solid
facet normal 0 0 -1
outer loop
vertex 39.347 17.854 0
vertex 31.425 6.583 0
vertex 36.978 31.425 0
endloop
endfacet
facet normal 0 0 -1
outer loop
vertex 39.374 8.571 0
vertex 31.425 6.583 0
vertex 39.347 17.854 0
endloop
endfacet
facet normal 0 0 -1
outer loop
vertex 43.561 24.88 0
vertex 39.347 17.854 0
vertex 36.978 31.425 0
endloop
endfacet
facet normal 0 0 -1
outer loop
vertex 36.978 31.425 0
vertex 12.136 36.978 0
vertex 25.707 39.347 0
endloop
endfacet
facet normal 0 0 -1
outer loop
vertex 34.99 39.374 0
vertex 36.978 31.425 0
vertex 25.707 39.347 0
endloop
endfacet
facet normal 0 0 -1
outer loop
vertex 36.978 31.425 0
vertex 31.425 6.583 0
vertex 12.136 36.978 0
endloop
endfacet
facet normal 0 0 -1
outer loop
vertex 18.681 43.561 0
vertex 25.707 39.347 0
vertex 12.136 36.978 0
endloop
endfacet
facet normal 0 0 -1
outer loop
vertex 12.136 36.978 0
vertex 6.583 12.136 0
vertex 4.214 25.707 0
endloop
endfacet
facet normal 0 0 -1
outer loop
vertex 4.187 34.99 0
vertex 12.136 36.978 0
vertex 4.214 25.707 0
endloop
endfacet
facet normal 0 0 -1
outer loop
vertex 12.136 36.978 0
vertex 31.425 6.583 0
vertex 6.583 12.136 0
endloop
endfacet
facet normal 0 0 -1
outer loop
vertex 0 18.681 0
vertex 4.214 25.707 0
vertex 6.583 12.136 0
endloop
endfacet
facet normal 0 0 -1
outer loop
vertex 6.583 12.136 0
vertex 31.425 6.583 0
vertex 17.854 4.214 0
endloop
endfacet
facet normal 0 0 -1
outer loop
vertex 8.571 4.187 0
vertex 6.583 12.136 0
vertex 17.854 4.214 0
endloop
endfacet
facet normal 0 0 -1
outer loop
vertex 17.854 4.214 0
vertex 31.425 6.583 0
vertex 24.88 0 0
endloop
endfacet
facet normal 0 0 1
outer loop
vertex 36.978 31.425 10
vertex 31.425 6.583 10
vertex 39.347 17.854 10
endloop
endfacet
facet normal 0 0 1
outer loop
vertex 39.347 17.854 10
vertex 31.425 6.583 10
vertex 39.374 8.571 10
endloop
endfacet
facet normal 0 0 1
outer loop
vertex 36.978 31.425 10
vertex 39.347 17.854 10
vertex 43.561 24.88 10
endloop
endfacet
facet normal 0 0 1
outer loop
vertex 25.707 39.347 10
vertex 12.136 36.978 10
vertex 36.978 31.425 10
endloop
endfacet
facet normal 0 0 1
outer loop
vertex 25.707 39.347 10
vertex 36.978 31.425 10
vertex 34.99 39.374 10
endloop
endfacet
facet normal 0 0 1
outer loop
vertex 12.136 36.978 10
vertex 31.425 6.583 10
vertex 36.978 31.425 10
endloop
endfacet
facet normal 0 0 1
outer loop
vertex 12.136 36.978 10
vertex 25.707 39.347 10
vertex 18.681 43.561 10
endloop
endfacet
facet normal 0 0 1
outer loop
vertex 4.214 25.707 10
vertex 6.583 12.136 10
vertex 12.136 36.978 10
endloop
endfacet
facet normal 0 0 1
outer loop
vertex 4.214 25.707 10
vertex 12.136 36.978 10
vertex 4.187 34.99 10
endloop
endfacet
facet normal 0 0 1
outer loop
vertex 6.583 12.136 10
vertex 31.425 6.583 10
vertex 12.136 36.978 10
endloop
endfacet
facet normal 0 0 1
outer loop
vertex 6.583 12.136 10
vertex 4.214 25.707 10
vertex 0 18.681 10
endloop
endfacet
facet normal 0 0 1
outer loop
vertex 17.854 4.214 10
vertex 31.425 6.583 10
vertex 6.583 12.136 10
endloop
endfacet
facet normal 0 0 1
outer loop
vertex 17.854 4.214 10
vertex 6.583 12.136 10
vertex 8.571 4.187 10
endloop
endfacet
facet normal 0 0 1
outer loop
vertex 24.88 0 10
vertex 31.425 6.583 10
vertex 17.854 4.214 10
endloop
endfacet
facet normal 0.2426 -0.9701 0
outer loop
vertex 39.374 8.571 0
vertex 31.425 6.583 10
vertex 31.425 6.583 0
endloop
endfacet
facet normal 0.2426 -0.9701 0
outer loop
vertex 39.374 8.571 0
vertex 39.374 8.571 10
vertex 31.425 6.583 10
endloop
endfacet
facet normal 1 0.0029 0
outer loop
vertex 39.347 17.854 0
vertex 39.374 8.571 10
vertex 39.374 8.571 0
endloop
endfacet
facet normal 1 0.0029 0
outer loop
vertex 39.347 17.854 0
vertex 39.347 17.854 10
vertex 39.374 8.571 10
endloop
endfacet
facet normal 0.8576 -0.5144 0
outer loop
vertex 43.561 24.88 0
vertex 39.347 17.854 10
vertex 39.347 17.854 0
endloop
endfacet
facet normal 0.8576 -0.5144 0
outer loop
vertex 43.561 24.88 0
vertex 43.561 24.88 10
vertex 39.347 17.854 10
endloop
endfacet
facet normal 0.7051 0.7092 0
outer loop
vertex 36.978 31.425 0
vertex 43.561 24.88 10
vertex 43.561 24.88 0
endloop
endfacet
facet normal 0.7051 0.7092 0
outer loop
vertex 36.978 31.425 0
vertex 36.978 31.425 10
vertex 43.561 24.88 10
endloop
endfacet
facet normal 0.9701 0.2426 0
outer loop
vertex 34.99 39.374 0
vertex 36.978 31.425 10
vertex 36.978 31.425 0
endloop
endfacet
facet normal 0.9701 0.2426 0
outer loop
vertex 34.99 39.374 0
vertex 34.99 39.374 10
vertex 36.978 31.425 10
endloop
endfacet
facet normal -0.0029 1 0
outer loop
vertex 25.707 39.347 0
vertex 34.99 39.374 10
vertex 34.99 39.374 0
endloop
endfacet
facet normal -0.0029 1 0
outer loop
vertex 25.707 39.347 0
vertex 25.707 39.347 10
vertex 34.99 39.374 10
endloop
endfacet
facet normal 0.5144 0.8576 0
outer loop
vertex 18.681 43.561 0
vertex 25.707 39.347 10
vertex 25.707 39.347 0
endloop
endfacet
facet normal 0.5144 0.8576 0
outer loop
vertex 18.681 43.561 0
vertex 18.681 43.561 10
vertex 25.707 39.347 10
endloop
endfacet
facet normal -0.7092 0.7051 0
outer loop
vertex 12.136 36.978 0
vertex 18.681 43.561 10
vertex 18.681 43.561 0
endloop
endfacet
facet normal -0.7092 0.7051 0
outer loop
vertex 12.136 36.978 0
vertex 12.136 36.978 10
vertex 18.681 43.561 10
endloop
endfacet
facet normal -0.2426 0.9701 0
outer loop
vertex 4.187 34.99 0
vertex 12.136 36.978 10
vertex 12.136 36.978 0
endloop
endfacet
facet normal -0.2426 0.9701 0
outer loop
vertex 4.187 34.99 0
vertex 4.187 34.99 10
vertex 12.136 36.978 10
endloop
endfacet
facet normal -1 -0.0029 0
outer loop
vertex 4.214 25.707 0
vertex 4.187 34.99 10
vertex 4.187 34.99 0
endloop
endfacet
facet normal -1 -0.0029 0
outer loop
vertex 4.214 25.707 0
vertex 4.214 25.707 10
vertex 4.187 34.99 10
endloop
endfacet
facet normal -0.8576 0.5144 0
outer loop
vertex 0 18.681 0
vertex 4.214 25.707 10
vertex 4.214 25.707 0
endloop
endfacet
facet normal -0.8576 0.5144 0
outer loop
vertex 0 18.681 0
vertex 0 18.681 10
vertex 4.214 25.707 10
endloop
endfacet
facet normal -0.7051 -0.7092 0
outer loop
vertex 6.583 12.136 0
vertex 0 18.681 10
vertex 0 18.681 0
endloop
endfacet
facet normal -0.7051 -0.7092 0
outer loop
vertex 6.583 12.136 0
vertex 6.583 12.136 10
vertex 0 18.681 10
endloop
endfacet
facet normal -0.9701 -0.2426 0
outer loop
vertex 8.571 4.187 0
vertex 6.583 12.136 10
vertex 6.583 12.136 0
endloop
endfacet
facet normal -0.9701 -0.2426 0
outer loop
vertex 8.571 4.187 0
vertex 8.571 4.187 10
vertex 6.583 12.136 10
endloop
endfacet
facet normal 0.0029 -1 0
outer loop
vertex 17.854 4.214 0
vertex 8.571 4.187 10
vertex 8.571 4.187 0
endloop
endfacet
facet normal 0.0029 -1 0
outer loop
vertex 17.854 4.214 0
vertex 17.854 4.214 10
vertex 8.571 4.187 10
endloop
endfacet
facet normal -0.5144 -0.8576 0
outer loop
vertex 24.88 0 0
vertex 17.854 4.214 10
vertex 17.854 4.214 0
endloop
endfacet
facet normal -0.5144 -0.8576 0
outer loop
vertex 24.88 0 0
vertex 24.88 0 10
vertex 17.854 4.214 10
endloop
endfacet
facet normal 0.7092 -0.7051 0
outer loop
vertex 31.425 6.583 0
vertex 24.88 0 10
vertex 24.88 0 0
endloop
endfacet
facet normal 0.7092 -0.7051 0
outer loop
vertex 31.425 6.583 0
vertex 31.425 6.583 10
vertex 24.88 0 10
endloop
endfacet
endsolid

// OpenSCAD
$fn = 32;

// ----------------------------------------------------------------------
// Chain sprocket: 8 teeth, 18 mm root radius
// ----------------------------------------------------------------------

// --- parameters (mm) ---
profile_height = 10;      // extrusion height
profile_points = 16;      // points of the closed outline

profile = [[39.347, 17.854], [43.561, 24.88], [36.978, 31.425], [34.99, 39.374], [25.707, 39.347], [18.681, 43.561], [12.136, 36.978], [4.187, 34.99], [4.214, 25.707], [0, 18.681], [6.583, 12.136], [8.571, 4.187], [17.854, 4.214], [24.88, 0], [31.425, 6.583], [39.374, 8.571]];  // single closed polygon, 16 points, counter clockwise

// --- the one profile operation ---
linear_extrude(height = profile_height) polygon(points = profile);
